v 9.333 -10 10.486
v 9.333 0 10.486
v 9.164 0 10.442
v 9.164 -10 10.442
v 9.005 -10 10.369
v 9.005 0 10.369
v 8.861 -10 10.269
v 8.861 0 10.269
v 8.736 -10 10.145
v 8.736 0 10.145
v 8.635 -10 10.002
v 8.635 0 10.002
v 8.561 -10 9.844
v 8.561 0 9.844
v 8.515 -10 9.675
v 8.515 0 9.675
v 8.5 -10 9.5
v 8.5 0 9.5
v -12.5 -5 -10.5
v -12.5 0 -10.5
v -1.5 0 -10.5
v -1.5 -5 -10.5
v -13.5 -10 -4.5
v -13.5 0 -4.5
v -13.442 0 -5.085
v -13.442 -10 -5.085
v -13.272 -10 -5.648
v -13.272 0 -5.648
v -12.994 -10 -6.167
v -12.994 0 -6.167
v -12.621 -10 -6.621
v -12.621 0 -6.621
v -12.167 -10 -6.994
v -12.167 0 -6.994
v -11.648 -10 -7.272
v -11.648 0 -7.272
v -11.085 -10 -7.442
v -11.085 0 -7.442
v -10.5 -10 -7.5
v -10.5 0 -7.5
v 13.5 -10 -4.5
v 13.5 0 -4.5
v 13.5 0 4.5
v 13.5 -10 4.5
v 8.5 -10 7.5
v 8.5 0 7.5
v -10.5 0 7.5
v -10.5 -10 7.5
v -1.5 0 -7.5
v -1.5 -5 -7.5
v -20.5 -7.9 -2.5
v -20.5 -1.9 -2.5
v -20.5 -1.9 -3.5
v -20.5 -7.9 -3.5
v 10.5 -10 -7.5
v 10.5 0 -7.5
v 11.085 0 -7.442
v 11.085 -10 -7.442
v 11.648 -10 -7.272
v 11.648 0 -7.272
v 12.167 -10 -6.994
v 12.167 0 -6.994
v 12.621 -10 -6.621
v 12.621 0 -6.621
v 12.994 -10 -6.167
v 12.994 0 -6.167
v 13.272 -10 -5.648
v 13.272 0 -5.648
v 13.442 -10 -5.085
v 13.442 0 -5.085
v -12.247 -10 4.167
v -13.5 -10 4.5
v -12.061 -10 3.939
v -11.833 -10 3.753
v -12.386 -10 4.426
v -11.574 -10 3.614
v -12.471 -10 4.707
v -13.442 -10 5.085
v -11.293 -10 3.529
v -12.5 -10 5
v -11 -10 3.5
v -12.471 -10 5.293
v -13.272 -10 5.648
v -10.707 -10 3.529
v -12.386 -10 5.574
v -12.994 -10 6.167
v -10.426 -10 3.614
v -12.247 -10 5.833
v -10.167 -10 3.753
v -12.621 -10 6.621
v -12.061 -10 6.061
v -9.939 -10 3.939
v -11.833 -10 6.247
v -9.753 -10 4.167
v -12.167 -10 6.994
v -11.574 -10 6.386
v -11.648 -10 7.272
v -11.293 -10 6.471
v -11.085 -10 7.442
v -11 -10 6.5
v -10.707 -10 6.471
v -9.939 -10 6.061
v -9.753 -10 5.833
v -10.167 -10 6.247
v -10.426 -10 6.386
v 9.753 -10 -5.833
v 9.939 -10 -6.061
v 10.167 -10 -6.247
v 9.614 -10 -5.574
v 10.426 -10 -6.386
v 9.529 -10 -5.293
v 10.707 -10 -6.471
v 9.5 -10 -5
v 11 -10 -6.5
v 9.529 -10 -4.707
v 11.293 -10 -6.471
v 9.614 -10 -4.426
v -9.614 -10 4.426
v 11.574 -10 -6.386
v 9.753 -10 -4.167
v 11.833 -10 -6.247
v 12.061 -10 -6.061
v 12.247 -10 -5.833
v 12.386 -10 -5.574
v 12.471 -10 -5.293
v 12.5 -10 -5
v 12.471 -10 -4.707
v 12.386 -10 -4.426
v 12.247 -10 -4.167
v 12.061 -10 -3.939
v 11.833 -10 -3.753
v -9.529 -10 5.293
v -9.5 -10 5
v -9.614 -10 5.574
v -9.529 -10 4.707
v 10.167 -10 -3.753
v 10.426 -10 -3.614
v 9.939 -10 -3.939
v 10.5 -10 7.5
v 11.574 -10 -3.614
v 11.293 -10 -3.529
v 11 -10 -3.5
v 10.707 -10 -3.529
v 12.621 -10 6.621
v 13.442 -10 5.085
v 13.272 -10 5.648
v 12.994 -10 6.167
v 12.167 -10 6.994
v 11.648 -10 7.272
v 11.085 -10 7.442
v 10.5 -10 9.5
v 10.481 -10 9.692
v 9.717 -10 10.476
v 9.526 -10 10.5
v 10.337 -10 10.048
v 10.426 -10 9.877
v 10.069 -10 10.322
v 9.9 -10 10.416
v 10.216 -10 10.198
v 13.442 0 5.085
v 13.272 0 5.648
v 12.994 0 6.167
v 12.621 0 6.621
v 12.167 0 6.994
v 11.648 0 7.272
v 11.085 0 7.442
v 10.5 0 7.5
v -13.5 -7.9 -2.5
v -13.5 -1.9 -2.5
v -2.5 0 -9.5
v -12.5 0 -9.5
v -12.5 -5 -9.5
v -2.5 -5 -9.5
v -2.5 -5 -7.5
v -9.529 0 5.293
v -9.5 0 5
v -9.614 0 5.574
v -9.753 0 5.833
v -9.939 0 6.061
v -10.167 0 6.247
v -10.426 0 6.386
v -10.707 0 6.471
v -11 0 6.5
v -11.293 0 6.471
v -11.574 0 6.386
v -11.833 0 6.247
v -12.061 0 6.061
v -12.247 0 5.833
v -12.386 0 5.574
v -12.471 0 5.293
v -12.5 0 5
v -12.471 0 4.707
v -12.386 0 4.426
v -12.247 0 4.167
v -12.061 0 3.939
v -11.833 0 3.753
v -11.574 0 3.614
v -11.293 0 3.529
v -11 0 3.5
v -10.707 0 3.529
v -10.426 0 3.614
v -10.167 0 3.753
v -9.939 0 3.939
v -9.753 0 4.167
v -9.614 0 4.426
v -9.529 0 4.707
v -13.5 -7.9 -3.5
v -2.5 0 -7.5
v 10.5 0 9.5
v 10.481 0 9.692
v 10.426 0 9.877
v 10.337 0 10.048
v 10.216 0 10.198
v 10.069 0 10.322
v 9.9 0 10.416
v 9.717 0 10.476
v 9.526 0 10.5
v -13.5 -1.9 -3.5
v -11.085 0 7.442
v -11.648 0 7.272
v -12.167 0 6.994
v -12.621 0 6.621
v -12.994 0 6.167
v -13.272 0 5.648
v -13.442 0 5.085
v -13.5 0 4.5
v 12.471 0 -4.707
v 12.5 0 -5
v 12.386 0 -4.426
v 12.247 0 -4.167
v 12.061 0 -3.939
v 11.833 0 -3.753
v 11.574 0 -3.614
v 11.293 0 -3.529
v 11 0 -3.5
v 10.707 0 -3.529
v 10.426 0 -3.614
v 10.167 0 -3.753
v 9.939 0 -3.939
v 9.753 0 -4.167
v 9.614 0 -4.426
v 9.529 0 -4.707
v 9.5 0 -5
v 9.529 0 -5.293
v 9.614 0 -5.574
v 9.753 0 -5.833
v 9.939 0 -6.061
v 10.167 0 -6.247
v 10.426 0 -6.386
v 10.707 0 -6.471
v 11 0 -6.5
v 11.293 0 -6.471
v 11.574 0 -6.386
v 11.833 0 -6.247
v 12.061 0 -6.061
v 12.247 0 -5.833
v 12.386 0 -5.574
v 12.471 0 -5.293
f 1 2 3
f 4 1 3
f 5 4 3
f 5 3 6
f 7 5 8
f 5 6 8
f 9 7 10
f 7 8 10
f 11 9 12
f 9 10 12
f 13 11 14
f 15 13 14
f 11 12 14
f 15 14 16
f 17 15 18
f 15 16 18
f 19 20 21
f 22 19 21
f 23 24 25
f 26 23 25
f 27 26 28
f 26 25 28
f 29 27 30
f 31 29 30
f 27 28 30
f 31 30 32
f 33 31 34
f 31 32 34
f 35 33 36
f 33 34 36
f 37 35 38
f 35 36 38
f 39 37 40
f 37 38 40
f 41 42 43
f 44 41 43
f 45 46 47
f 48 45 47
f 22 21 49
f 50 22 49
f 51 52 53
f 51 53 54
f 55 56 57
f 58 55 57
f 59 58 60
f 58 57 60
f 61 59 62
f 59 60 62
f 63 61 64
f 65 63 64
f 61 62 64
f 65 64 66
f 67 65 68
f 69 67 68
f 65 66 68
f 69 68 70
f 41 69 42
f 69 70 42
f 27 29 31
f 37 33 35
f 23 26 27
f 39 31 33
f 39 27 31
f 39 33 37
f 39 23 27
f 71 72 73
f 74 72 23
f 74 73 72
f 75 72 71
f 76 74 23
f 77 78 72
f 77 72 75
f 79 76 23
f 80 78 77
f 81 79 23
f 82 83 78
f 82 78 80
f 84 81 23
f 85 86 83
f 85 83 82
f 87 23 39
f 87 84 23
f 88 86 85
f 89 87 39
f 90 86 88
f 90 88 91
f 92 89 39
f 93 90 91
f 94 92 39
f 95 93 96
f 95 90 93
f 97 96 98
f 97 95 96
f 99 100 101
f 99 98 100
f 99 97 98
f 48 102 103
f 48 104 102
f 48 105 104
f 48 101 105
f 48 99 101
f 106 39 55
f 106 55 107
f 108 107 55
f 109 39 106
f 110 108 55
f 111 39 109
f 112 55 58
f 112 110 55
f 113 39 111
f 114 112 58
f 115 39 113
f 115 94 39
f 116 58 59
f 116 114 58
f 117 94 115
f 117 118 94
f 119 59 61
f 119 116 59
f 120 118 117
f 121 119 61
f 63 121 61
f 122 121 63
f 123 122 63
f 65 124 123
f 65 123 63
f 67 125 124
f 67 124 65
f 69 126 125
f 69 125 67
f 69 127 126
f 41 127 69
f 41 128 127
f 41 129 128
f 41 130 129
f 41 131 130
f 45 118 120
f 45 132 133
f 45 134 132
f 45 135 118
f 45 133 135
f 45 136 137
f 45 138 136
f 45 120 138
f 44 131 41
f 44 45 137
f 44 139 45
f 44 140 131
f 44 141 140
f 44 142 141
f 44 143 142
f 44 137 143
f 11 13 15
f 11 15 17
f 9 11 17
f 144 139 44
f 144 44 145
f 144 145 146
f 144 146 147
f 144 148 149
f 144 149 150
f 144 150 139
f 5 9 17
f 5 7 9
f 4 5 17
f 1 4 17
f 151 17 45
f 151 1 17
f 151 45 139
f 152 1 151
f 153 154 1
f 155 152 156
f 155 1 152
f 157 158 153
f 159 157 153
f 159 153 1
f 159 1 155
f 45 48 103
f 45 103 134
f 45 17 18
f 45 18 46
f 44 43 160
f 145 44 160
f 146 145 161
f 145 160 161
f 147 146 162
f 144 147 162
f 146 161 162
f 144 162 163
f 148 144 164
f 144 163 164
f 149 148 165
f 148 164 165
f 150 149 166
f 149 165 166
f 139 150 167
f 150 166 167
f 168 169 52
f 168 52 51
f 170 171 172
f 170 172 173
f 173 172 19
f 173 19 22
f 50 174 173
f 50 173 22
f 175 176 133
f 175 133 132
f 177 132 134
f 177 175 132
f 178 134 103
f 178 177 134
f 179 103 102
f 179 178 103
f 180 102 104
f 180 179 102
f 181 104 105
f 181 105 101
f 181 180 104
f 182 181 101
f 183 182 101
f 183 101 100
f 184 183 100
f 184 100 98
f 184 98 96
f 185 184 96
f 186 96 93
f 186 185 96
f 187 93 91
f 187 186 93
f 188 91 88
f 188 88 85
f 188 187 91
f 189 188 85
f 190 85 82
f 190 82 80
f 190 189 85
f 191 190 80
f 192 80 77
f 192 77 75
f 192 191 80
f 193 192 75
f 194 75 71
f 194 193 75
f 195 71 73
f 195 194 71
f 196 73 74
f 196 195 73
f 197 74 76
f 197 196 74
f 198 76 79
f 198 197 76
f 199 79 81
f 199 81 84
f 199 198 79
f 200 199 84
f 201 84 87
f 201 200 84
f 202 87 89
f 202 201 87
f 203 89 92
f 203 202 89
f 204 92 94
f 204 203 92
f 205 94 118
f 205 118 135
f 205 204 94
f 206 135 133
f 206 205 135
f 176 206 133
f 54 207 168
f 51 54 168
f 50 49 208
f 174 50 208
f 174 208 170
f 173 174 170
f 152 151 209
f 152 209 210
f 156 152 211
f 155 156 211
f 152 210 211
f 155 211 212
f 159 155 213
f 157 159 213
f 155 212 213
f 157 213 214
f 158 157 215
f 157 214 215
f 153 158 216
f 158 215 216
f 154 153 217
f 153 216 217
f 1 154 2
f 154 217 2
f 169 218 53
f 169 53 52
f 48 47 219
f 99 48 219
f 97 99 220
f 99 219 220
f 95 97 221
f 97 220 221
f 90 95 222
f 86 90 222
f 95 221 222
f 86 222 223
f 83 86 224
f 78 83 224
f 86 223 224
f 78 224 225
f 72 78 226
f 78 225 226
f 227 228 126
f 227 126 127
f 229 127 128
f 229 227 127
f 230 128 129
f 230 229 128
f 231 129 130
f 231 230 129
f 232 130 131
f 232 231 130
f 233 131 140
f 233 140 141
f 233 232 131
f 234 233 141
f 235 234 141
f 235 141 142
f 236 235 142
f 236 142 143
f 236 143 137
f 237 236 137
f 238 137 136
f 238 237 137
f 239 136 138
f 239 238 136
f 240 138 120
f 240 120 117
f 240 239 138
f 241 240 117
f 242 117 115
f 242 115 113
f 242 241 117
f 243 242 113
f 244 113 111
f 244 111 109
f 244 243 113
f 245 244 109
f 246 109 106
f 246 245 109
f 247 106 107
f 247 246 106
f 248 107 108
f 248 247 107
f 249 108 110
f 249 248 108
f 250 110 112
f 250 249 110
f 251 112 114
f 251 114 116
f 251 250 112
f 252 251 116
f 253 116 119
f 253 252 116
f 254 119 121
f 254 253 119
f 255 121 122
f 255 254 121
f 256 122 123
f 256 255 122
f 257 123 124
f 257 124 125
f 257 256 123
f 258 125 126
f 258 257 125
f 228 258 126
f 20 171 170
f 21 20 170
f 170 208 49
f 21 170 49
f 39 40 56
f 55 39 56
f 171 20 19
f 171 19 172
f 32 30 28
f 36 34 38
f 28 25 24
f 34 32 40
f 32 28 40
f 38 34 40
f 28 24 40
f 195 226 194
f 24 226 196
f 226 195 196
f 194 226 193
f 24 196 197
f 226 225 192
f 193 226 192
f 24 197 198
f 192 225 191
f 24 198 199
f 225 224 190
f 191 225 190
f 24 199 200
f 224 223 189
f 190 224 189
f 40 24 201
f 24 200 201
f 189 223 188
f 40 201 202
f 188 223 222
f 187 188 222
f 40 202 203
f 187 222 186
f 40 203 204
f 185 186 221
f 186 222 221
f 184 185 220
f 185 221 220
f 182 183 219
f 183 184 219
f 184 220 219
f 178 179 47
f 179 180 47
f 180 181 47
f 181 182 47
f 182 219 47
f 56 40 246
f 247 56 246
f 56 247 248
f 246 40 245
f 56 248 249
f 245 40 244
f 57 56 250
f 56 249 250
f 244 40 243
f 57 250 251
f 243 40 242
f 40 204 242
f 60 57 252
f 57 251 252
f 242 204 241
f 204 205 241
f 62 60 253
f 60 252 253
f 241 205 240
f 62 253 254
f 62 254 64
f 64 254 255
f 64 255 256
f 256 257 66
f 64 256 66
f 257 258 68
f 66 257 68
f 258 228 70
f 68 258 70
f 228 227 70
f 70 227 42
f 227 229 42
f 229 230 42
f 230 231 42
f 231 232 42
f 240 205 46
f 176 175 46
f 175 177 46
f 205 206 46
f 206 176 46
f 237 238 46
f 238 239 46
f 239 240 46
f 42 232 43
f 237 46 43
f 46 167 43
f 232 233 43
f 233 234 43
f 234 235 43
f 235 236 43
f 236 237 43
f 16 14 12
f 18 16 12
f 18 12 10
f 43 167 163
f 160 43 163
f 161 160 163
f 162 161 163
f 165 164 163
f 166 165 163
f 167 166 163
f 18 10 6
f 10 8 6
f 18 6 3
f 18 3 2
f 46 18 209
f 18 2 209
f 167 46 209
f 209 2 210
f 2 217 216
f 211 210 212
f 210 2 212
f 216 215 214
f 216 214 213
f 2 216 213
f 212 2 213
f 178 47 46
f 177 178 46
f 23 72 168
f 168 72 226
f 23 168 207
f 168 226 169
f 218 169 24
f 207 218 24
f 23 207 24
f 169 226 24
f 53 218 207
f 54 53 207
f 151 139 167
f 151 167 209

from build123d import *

# Parameters (mm, degrees)
F0_R     = 1.5
F1_DEPTH = 10
F0_W     = 10
F0_H     = 1
F2_DEPTH = 5
F3_W     = 6
F3_H     = 1
F4_DEPTH = 7
F5_DEPTH = 10


with BuildPart() as f1:
    # F0 (on Front) → F1 (new body)
    with BuildSketch(Plane.XZ):
        with BuildLine():
            Line((2.5, 7.5), (-10.5, 7.5))
            ThreePointArc((-10.5, 7.5), (-12.62132, 6.62132), (-13.5, 4.5))
            Line((-13.5, 4.5), (-13.5, -2.5))
            Line((-13.5, -2.5), (-13.5, -3.5))
            Line((-13.5, -3.5), (-13.5, -4.5))
            ThreePointArc((-13.5, -4.5), (-12.62132, -6.62132), (-10.5, -7.5))
            Line((-10.5, -7.5), (-2.5, -7.5))
            Line((-2.5, -7.5), (-1.5, -7.5))
            Line((-1.5, -7.5), (10.5, -7.5))
            ThreePointArc((10.5, -7.5), (12.62132, -6.62132), (13.5, -4.5))
            Line((13.5, -4.5), (13.5, 4.5))
            ThreePointArc((13.5, 4.5), (12.62132, 6.62132), (10.5, 7.5))
            Line((10.5, 7.5), (8.5, 7.5))
            Line((8.5, 7.5), (3.5, 7.5))
            Line((3.5, 7.5), (2.5, 7.5))
        make_face()
        with Locations((11, -5)):
            Circle(F0_R, mode=Mode.SUBTRACT)
        with Locations((-11, 5)):
            Circle(F0_R, mode=Mode.SUBTRACT)
    extrude(amount=F1_DEPTH)

    # F3 (on face) → F4 (join)
    with BuildSketch(Plane(origin=(-13.5, 0, 0), x_dir=(0, -1, 0), z_dir=(-1, 0, 0))):
        with Locations((4.9, -3)):
            Rectangle(F3_W, F3_H)
    extrude(amount=F4_DEPTH)

    # F0 (on Front) → F5 (join)
    with BuildSketch(Plane.XZ):
        with BuildLine():
            Line((8.5, 9.5), (8.5, 7.5))
            Line((8.5, 7.5), (10.5, 7.5))
            Line((10.5, 7.5), (10.5, 9.5))
            ThreePointArc((10.5, 9.5), (9.5, 8.5), (8.5, 9.5))
        make_face()
        with BuildLine():
            Line((10.5, 9.5), (8.5, 9.5))
            ThreePointArc((8.5, 9.5), (9.5, 8.5), (10.5, 9.5))
        make_face()
        with BuildLine():
            ThreePointArc((9.333333, 10.486013), (8.736237, 10.145497), (8.5, 9.5))
            Line((8.5, 9.5), (10.5, 9.5))
            ThreePointArc((10.5, 9.5), (10.145497, 10.263763), (9.333333, 10.486013))
        make_face()
    extrude(amount=F5_DEPTH)


with BuildPart() as f2:
    # F0 (on Front) → F2 (new body)
    with BuildSketch(Plane.XZ):
        with Locations((-7.5, -10)):
            Rectangle(F0_W, F0_H)
        Polygon((-1.5, -7.5), (-2.5, -7.5), (-2.5, -9.5), (-2.5, -10.5), (-1.5, -10.5), align=None)
    extrude(amount=F2_DEPTH)


solid = Compound([f1.part, f2.part])
